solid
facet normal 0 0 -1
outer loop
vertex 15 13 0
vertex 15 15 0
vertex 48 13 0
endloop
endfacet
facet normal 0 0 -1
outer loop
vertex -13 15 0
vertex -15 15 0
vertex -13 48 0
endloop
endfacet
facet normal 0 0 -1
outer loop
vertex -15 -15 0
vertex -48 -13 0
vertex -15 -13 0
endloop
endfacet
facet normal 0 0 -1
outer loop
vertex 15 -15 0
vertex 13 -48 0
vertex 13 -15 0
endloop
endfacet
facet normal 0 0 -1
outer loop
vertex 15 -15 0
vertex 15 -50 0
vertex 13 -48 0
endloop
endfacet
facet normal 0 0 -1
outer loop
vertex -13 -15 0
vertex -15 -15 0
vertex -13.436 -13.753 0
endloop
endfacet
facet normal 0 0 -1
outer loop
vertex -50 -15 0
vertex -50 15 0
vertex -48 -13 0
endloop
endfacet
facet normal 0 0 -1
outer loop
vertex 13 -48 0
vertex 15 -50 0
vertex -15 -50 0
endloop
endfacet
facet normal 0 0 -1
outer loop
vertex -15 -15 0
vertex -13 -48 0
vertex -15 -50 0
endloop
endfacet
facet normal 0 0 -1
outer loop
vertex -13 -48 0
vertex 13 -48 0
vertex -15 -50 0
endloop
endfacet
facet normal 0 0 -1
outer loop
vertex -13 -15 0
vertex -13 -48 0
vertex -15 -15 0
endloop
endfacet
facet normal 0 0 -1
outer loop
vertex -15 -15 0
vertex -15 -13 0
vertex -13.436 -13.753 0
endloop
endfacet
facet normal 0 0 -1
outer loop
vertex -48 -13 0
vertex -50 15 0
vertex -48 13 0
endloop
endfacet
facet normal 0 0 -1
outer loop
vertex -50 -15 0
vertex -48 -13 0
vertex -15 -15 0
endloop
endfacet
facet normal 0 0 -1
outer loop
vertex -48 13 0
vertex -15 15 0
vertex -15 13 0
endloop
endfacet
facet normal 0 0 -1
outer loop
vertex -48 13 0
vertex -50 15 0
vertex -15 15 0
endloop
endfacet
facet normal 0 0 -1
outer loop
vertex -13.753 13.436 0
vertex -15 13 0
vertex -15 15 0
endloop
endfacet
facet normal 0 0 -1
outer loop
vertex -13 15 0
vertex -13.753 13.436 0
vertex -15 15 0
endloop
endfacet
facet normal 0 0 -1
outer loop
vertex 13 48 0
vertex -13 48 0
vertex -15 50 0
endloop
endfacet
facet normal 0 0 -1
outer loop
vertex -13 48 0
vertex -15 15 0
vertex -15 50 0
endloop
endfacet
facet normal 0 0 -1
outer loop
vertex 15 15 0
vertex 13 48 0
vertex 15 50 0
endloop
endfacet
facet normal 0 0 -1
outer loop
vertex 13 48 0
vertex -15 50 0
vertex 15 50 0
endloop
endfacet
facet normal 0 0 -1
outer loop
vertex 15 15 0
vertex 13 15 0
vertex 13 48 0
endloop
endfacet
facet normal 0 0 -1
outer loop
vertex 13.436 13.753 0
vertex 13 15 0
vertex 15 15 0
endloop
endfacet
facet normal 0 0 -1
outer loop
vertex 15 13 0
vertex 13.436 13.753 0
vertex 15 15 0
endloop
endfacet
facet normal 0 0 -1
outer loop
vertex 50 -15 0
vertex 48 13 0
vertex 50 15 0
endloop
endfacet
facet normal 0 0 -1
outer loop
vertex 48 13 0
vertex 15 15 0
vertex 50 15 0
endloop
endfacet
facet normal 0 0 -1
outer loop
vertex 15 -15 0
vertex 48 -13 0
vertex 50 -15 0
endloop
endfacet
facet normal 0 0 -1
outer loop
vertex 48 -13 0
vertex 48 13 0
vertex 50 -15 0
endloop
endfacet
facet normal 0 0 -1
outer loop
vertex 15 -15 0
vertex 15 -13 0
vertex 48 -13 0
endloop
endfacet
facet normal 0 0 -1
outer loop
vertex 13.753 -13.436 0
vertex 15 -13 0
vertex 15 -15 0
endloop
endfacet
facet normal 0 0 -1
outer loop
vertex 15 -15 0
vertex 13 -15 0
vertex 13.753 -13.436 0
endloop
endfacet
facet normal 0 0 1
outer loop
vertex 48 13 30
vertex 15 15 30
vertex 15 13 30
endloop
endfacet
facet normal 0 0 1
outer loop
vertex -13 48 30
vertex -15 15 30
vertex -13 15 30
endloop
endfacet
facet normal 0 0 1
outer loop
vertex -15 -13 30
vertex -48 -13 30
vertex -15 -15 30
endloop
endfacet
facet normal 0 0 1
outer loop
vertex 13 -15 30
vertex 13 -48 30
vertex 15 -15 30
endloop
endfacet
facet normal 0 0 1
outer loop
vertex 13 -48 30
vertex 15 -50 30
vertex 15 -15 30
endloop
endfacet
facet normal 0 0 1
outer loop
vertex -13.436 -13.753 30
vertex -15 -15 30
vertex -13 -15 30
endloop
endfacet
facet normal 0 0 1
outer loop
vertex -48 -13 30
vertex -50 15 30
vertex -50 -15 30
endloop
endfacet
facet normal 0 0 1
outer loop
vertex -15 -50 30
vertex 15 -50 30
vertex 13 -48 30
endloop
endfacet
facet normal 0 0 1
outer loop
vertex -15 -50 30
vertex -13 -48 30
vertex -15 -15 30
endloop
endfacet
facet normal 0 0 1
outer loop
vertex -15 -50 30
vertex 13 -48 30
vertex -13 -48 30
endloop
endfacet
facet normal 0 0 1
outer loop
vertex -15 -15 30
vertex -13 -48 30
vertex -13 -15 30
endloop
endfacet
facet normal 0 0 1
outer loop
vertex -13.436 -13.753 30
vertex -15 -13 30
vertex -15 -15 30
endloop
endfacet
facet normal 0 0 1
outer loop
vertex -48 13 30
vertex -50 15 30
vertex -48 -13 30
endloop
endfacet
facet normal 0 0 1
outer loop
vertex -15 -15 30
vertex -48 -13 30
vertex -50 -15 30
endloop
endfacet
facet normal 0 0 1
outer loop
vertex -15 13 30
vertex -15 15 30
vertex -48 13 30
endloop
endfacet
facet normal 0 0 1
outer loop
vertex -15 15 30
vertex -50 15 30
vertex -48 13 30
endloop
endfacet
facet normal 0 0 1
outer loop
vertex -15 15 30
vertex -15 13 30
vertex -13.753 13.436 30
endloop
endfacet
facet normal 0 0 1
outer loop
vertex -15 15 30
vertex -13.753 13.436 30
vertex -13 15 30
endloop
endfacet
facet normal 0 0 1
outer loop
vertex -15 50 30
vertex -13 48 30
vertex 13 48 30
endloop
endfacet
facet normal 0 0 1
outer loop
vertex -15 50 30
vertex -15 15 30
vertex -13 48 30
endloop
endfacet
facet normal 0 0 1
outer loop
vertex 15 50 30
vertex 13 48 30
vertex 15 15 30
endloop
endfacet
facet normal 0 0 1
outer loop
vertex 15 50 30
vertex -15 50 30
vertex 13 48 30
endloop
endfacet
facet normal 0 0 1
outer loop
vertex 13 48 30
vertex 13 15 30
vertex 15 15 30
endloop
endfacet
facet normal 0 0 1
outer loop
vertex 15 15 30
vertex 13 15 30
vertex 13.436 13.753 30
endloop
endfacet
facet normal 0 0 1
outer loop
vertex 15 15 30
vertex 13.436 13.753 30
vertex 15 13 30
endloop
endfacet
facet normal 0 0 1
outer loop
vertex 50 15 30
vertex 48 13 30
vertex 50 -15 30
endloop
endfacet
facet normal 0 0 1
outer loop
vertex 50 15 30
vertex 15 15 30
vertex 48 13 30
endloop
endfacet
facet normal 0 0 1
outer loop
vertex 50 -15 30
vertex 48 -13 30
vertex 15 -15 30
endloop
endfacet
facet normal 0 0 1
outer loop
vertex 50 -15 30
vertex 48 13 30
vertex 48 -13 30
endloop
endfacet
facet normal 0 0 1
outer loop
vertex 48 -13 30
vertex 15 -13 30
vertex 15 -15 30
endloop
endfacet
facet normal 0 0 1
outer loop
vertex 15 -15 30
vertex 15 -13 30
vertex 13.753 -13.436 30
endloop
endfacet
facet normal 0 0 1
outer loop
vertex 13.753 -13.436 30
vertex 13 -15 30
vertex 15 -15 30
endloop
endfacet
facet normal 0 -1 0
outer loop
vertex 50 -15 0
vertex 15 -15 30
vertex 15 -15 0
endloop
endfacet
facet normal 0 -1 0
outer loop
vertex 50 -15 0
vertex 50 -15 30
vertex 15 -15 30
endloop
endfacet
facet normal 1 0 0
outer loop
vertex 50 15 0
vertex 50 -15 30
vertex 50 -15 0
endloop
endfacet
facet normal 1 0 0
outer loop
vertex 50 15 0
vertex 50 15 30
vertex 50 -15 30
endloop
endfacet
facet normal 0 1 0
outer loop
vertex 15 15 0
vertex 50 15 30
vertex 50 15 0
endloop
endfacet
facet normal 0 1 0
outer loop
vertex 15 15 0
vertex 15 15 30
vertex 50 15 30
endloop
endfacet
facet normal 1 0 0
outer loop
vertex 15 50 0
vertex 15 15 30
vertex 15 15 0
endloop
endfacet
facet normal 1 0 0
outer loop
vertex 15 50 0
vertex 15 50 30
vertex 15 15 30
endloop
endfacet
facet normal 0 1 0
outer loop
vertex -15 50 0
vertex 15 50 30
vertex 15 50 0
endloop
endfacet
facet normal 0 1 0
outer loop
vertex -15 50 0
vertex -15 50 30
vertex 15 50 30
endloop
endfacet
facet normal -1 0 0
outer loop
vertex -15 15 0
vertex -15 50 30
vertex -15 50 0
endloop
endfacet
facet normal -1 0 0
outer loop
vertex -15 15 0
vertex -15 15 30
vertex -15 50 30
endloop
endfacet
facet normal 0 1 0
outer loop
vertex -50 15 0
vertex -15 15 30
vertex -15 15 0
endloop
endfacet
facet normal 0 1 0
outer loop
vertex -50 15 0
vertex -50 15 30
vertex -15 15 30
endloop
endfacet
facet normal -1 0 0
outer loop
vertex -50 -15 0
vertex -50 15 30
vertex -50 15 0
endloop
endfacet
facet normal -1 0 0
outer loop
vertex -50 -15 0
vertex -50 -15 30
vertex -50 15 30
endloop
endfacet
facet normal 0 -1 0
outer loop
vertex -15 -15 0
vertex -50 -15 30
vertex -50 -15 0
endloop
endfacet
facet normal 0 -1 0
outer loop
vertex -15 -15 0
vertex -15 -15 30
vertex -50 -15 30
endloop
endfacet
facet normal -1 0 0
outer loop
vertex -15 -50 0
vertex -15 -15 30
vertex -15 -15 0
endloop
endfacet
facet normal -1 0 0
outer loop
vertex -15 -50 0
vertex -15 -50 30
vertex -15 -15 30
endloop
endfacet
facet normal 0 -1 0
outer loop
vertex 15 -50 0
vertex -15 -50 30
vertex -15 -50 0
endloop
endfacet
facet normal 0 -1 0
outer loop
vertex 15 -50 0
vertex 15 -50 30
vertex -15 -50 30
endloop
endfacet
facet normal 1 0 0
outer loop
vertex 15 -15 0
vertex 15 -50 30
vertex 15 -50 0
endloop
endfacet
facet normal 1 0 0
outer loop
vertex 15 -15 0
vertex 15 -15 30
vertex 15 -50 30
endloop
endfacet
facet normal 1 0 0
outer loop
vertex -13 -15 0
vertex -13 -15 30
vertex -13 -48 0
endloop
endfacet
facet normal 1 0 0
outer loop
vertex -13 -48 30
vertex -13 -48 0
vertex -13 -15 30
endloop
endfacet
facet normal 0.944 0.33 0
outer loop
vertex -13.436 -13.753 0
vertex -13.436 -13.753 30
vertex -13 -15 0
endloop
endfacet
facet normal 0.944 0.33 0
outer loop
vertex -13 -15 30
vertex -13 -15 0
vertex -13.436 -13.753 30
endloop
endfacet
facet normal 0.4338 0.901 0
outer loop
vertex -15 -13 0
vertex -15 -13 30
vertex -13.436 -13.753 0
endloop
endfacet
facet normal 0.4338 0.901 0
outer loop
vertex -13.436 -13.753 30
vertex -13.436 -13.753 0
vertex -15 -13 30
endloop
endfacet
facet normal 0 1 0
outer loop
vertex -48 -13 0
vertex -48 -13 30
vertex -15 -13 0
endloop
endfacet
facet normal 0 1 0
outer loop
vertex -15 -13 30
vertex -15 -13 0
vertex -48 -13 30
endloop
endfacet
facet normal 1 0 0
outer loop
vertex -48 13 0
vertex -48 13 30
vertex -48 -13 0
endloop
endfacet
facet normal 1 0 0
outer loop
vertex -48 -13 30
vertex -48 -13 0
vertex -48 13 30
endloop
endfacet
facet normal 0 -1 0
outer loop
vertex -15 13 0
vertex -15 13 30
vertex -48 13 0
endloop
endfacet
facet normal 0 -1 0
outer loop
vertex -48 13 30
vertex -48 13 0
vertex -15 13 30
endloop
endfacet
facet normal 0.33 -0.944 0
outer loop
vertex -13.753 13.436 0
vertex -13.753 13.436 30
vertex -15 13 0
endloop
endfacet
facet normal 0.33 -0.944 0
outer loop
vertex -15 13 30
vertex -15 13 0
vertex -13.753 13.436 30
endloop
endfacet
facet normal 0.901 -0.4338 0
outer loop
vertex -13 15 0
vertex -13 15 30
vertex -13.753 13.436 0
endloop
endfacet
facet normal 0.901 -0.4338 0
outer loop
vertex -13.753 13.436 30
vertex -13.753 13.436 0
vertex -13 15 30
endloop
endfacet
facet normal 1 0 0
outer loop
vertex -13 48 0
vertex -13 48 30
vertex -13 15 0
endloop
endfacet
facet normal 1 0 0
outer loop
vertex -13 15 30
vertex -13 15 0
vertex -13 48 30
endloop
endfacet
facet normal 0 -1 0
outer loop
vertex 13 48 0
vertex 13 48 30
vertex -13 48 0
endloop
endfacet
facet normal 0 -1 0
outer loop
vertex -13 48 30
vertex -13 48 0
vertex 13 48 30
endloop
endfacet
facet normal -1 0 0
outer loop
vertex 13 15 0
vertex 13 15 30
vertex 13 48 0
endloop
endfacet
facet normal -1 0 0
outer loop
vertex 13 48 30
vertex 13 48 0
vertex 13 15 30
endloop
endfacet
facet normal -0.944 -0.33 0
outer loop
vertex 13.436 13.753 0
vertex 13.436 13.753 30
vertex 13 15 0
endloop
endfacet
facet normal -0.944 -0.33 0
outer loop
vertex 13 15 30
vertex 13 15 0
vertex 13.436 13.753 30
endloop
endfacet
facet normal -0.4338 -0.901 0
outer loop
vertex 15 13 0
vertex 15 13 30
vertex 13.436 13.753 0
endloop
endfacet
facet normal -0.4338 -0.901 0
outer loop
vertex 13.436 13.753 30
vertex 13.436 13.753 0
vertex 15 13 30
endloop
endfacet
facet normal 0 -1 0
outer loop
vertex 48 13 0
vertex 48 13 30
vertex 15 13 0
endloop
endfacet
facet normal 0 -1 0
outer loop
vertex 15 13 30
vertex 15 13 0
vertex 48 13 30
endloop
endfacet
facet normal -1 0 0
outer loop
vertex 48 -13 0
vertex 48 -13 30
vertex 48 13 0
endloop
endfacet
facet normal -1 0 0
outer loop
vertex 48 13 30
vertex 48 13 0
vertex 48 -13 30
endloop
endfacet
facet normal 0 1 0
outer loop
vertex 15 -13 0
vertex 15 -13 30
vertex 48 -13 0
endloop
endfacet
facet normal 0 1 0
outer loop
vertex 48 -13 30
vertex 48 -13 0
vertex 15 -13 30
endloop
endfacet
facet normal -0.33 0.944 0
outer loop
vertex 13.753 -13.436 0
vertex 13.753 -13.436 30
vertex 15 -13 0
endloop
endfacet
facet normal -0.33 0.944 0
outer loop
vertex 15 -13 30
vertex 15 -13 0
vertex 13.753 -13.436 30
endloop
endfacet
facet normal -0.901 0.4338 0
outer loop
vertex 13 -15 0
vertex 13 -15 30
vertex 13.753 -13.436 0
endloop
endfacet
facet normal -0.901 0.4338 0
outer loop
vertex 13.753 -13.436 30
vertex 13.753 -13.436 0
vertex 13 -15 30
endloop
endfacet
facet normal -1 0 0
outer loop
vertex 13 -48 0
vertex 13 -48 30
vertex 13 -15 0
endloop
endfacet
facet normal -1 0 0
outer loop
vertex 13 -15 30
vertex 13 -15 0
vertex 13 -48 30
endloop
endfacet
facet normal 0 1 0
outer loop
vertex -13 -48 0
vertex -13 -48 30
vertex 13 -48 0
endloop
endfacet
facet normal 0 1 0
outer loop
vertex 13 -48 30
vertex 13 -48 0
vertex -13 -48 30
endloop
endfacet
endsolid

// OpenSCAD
linear_extrude(30) {
  difference() {
    union() {
      square(size=[100, 30], center=true);
      square(size=[30, 100], center=true);
    }
    offset(-2) {
      square(size=[100, 30], center=true);
      square(size=[30, 100], center=true);
    }
  }
}
